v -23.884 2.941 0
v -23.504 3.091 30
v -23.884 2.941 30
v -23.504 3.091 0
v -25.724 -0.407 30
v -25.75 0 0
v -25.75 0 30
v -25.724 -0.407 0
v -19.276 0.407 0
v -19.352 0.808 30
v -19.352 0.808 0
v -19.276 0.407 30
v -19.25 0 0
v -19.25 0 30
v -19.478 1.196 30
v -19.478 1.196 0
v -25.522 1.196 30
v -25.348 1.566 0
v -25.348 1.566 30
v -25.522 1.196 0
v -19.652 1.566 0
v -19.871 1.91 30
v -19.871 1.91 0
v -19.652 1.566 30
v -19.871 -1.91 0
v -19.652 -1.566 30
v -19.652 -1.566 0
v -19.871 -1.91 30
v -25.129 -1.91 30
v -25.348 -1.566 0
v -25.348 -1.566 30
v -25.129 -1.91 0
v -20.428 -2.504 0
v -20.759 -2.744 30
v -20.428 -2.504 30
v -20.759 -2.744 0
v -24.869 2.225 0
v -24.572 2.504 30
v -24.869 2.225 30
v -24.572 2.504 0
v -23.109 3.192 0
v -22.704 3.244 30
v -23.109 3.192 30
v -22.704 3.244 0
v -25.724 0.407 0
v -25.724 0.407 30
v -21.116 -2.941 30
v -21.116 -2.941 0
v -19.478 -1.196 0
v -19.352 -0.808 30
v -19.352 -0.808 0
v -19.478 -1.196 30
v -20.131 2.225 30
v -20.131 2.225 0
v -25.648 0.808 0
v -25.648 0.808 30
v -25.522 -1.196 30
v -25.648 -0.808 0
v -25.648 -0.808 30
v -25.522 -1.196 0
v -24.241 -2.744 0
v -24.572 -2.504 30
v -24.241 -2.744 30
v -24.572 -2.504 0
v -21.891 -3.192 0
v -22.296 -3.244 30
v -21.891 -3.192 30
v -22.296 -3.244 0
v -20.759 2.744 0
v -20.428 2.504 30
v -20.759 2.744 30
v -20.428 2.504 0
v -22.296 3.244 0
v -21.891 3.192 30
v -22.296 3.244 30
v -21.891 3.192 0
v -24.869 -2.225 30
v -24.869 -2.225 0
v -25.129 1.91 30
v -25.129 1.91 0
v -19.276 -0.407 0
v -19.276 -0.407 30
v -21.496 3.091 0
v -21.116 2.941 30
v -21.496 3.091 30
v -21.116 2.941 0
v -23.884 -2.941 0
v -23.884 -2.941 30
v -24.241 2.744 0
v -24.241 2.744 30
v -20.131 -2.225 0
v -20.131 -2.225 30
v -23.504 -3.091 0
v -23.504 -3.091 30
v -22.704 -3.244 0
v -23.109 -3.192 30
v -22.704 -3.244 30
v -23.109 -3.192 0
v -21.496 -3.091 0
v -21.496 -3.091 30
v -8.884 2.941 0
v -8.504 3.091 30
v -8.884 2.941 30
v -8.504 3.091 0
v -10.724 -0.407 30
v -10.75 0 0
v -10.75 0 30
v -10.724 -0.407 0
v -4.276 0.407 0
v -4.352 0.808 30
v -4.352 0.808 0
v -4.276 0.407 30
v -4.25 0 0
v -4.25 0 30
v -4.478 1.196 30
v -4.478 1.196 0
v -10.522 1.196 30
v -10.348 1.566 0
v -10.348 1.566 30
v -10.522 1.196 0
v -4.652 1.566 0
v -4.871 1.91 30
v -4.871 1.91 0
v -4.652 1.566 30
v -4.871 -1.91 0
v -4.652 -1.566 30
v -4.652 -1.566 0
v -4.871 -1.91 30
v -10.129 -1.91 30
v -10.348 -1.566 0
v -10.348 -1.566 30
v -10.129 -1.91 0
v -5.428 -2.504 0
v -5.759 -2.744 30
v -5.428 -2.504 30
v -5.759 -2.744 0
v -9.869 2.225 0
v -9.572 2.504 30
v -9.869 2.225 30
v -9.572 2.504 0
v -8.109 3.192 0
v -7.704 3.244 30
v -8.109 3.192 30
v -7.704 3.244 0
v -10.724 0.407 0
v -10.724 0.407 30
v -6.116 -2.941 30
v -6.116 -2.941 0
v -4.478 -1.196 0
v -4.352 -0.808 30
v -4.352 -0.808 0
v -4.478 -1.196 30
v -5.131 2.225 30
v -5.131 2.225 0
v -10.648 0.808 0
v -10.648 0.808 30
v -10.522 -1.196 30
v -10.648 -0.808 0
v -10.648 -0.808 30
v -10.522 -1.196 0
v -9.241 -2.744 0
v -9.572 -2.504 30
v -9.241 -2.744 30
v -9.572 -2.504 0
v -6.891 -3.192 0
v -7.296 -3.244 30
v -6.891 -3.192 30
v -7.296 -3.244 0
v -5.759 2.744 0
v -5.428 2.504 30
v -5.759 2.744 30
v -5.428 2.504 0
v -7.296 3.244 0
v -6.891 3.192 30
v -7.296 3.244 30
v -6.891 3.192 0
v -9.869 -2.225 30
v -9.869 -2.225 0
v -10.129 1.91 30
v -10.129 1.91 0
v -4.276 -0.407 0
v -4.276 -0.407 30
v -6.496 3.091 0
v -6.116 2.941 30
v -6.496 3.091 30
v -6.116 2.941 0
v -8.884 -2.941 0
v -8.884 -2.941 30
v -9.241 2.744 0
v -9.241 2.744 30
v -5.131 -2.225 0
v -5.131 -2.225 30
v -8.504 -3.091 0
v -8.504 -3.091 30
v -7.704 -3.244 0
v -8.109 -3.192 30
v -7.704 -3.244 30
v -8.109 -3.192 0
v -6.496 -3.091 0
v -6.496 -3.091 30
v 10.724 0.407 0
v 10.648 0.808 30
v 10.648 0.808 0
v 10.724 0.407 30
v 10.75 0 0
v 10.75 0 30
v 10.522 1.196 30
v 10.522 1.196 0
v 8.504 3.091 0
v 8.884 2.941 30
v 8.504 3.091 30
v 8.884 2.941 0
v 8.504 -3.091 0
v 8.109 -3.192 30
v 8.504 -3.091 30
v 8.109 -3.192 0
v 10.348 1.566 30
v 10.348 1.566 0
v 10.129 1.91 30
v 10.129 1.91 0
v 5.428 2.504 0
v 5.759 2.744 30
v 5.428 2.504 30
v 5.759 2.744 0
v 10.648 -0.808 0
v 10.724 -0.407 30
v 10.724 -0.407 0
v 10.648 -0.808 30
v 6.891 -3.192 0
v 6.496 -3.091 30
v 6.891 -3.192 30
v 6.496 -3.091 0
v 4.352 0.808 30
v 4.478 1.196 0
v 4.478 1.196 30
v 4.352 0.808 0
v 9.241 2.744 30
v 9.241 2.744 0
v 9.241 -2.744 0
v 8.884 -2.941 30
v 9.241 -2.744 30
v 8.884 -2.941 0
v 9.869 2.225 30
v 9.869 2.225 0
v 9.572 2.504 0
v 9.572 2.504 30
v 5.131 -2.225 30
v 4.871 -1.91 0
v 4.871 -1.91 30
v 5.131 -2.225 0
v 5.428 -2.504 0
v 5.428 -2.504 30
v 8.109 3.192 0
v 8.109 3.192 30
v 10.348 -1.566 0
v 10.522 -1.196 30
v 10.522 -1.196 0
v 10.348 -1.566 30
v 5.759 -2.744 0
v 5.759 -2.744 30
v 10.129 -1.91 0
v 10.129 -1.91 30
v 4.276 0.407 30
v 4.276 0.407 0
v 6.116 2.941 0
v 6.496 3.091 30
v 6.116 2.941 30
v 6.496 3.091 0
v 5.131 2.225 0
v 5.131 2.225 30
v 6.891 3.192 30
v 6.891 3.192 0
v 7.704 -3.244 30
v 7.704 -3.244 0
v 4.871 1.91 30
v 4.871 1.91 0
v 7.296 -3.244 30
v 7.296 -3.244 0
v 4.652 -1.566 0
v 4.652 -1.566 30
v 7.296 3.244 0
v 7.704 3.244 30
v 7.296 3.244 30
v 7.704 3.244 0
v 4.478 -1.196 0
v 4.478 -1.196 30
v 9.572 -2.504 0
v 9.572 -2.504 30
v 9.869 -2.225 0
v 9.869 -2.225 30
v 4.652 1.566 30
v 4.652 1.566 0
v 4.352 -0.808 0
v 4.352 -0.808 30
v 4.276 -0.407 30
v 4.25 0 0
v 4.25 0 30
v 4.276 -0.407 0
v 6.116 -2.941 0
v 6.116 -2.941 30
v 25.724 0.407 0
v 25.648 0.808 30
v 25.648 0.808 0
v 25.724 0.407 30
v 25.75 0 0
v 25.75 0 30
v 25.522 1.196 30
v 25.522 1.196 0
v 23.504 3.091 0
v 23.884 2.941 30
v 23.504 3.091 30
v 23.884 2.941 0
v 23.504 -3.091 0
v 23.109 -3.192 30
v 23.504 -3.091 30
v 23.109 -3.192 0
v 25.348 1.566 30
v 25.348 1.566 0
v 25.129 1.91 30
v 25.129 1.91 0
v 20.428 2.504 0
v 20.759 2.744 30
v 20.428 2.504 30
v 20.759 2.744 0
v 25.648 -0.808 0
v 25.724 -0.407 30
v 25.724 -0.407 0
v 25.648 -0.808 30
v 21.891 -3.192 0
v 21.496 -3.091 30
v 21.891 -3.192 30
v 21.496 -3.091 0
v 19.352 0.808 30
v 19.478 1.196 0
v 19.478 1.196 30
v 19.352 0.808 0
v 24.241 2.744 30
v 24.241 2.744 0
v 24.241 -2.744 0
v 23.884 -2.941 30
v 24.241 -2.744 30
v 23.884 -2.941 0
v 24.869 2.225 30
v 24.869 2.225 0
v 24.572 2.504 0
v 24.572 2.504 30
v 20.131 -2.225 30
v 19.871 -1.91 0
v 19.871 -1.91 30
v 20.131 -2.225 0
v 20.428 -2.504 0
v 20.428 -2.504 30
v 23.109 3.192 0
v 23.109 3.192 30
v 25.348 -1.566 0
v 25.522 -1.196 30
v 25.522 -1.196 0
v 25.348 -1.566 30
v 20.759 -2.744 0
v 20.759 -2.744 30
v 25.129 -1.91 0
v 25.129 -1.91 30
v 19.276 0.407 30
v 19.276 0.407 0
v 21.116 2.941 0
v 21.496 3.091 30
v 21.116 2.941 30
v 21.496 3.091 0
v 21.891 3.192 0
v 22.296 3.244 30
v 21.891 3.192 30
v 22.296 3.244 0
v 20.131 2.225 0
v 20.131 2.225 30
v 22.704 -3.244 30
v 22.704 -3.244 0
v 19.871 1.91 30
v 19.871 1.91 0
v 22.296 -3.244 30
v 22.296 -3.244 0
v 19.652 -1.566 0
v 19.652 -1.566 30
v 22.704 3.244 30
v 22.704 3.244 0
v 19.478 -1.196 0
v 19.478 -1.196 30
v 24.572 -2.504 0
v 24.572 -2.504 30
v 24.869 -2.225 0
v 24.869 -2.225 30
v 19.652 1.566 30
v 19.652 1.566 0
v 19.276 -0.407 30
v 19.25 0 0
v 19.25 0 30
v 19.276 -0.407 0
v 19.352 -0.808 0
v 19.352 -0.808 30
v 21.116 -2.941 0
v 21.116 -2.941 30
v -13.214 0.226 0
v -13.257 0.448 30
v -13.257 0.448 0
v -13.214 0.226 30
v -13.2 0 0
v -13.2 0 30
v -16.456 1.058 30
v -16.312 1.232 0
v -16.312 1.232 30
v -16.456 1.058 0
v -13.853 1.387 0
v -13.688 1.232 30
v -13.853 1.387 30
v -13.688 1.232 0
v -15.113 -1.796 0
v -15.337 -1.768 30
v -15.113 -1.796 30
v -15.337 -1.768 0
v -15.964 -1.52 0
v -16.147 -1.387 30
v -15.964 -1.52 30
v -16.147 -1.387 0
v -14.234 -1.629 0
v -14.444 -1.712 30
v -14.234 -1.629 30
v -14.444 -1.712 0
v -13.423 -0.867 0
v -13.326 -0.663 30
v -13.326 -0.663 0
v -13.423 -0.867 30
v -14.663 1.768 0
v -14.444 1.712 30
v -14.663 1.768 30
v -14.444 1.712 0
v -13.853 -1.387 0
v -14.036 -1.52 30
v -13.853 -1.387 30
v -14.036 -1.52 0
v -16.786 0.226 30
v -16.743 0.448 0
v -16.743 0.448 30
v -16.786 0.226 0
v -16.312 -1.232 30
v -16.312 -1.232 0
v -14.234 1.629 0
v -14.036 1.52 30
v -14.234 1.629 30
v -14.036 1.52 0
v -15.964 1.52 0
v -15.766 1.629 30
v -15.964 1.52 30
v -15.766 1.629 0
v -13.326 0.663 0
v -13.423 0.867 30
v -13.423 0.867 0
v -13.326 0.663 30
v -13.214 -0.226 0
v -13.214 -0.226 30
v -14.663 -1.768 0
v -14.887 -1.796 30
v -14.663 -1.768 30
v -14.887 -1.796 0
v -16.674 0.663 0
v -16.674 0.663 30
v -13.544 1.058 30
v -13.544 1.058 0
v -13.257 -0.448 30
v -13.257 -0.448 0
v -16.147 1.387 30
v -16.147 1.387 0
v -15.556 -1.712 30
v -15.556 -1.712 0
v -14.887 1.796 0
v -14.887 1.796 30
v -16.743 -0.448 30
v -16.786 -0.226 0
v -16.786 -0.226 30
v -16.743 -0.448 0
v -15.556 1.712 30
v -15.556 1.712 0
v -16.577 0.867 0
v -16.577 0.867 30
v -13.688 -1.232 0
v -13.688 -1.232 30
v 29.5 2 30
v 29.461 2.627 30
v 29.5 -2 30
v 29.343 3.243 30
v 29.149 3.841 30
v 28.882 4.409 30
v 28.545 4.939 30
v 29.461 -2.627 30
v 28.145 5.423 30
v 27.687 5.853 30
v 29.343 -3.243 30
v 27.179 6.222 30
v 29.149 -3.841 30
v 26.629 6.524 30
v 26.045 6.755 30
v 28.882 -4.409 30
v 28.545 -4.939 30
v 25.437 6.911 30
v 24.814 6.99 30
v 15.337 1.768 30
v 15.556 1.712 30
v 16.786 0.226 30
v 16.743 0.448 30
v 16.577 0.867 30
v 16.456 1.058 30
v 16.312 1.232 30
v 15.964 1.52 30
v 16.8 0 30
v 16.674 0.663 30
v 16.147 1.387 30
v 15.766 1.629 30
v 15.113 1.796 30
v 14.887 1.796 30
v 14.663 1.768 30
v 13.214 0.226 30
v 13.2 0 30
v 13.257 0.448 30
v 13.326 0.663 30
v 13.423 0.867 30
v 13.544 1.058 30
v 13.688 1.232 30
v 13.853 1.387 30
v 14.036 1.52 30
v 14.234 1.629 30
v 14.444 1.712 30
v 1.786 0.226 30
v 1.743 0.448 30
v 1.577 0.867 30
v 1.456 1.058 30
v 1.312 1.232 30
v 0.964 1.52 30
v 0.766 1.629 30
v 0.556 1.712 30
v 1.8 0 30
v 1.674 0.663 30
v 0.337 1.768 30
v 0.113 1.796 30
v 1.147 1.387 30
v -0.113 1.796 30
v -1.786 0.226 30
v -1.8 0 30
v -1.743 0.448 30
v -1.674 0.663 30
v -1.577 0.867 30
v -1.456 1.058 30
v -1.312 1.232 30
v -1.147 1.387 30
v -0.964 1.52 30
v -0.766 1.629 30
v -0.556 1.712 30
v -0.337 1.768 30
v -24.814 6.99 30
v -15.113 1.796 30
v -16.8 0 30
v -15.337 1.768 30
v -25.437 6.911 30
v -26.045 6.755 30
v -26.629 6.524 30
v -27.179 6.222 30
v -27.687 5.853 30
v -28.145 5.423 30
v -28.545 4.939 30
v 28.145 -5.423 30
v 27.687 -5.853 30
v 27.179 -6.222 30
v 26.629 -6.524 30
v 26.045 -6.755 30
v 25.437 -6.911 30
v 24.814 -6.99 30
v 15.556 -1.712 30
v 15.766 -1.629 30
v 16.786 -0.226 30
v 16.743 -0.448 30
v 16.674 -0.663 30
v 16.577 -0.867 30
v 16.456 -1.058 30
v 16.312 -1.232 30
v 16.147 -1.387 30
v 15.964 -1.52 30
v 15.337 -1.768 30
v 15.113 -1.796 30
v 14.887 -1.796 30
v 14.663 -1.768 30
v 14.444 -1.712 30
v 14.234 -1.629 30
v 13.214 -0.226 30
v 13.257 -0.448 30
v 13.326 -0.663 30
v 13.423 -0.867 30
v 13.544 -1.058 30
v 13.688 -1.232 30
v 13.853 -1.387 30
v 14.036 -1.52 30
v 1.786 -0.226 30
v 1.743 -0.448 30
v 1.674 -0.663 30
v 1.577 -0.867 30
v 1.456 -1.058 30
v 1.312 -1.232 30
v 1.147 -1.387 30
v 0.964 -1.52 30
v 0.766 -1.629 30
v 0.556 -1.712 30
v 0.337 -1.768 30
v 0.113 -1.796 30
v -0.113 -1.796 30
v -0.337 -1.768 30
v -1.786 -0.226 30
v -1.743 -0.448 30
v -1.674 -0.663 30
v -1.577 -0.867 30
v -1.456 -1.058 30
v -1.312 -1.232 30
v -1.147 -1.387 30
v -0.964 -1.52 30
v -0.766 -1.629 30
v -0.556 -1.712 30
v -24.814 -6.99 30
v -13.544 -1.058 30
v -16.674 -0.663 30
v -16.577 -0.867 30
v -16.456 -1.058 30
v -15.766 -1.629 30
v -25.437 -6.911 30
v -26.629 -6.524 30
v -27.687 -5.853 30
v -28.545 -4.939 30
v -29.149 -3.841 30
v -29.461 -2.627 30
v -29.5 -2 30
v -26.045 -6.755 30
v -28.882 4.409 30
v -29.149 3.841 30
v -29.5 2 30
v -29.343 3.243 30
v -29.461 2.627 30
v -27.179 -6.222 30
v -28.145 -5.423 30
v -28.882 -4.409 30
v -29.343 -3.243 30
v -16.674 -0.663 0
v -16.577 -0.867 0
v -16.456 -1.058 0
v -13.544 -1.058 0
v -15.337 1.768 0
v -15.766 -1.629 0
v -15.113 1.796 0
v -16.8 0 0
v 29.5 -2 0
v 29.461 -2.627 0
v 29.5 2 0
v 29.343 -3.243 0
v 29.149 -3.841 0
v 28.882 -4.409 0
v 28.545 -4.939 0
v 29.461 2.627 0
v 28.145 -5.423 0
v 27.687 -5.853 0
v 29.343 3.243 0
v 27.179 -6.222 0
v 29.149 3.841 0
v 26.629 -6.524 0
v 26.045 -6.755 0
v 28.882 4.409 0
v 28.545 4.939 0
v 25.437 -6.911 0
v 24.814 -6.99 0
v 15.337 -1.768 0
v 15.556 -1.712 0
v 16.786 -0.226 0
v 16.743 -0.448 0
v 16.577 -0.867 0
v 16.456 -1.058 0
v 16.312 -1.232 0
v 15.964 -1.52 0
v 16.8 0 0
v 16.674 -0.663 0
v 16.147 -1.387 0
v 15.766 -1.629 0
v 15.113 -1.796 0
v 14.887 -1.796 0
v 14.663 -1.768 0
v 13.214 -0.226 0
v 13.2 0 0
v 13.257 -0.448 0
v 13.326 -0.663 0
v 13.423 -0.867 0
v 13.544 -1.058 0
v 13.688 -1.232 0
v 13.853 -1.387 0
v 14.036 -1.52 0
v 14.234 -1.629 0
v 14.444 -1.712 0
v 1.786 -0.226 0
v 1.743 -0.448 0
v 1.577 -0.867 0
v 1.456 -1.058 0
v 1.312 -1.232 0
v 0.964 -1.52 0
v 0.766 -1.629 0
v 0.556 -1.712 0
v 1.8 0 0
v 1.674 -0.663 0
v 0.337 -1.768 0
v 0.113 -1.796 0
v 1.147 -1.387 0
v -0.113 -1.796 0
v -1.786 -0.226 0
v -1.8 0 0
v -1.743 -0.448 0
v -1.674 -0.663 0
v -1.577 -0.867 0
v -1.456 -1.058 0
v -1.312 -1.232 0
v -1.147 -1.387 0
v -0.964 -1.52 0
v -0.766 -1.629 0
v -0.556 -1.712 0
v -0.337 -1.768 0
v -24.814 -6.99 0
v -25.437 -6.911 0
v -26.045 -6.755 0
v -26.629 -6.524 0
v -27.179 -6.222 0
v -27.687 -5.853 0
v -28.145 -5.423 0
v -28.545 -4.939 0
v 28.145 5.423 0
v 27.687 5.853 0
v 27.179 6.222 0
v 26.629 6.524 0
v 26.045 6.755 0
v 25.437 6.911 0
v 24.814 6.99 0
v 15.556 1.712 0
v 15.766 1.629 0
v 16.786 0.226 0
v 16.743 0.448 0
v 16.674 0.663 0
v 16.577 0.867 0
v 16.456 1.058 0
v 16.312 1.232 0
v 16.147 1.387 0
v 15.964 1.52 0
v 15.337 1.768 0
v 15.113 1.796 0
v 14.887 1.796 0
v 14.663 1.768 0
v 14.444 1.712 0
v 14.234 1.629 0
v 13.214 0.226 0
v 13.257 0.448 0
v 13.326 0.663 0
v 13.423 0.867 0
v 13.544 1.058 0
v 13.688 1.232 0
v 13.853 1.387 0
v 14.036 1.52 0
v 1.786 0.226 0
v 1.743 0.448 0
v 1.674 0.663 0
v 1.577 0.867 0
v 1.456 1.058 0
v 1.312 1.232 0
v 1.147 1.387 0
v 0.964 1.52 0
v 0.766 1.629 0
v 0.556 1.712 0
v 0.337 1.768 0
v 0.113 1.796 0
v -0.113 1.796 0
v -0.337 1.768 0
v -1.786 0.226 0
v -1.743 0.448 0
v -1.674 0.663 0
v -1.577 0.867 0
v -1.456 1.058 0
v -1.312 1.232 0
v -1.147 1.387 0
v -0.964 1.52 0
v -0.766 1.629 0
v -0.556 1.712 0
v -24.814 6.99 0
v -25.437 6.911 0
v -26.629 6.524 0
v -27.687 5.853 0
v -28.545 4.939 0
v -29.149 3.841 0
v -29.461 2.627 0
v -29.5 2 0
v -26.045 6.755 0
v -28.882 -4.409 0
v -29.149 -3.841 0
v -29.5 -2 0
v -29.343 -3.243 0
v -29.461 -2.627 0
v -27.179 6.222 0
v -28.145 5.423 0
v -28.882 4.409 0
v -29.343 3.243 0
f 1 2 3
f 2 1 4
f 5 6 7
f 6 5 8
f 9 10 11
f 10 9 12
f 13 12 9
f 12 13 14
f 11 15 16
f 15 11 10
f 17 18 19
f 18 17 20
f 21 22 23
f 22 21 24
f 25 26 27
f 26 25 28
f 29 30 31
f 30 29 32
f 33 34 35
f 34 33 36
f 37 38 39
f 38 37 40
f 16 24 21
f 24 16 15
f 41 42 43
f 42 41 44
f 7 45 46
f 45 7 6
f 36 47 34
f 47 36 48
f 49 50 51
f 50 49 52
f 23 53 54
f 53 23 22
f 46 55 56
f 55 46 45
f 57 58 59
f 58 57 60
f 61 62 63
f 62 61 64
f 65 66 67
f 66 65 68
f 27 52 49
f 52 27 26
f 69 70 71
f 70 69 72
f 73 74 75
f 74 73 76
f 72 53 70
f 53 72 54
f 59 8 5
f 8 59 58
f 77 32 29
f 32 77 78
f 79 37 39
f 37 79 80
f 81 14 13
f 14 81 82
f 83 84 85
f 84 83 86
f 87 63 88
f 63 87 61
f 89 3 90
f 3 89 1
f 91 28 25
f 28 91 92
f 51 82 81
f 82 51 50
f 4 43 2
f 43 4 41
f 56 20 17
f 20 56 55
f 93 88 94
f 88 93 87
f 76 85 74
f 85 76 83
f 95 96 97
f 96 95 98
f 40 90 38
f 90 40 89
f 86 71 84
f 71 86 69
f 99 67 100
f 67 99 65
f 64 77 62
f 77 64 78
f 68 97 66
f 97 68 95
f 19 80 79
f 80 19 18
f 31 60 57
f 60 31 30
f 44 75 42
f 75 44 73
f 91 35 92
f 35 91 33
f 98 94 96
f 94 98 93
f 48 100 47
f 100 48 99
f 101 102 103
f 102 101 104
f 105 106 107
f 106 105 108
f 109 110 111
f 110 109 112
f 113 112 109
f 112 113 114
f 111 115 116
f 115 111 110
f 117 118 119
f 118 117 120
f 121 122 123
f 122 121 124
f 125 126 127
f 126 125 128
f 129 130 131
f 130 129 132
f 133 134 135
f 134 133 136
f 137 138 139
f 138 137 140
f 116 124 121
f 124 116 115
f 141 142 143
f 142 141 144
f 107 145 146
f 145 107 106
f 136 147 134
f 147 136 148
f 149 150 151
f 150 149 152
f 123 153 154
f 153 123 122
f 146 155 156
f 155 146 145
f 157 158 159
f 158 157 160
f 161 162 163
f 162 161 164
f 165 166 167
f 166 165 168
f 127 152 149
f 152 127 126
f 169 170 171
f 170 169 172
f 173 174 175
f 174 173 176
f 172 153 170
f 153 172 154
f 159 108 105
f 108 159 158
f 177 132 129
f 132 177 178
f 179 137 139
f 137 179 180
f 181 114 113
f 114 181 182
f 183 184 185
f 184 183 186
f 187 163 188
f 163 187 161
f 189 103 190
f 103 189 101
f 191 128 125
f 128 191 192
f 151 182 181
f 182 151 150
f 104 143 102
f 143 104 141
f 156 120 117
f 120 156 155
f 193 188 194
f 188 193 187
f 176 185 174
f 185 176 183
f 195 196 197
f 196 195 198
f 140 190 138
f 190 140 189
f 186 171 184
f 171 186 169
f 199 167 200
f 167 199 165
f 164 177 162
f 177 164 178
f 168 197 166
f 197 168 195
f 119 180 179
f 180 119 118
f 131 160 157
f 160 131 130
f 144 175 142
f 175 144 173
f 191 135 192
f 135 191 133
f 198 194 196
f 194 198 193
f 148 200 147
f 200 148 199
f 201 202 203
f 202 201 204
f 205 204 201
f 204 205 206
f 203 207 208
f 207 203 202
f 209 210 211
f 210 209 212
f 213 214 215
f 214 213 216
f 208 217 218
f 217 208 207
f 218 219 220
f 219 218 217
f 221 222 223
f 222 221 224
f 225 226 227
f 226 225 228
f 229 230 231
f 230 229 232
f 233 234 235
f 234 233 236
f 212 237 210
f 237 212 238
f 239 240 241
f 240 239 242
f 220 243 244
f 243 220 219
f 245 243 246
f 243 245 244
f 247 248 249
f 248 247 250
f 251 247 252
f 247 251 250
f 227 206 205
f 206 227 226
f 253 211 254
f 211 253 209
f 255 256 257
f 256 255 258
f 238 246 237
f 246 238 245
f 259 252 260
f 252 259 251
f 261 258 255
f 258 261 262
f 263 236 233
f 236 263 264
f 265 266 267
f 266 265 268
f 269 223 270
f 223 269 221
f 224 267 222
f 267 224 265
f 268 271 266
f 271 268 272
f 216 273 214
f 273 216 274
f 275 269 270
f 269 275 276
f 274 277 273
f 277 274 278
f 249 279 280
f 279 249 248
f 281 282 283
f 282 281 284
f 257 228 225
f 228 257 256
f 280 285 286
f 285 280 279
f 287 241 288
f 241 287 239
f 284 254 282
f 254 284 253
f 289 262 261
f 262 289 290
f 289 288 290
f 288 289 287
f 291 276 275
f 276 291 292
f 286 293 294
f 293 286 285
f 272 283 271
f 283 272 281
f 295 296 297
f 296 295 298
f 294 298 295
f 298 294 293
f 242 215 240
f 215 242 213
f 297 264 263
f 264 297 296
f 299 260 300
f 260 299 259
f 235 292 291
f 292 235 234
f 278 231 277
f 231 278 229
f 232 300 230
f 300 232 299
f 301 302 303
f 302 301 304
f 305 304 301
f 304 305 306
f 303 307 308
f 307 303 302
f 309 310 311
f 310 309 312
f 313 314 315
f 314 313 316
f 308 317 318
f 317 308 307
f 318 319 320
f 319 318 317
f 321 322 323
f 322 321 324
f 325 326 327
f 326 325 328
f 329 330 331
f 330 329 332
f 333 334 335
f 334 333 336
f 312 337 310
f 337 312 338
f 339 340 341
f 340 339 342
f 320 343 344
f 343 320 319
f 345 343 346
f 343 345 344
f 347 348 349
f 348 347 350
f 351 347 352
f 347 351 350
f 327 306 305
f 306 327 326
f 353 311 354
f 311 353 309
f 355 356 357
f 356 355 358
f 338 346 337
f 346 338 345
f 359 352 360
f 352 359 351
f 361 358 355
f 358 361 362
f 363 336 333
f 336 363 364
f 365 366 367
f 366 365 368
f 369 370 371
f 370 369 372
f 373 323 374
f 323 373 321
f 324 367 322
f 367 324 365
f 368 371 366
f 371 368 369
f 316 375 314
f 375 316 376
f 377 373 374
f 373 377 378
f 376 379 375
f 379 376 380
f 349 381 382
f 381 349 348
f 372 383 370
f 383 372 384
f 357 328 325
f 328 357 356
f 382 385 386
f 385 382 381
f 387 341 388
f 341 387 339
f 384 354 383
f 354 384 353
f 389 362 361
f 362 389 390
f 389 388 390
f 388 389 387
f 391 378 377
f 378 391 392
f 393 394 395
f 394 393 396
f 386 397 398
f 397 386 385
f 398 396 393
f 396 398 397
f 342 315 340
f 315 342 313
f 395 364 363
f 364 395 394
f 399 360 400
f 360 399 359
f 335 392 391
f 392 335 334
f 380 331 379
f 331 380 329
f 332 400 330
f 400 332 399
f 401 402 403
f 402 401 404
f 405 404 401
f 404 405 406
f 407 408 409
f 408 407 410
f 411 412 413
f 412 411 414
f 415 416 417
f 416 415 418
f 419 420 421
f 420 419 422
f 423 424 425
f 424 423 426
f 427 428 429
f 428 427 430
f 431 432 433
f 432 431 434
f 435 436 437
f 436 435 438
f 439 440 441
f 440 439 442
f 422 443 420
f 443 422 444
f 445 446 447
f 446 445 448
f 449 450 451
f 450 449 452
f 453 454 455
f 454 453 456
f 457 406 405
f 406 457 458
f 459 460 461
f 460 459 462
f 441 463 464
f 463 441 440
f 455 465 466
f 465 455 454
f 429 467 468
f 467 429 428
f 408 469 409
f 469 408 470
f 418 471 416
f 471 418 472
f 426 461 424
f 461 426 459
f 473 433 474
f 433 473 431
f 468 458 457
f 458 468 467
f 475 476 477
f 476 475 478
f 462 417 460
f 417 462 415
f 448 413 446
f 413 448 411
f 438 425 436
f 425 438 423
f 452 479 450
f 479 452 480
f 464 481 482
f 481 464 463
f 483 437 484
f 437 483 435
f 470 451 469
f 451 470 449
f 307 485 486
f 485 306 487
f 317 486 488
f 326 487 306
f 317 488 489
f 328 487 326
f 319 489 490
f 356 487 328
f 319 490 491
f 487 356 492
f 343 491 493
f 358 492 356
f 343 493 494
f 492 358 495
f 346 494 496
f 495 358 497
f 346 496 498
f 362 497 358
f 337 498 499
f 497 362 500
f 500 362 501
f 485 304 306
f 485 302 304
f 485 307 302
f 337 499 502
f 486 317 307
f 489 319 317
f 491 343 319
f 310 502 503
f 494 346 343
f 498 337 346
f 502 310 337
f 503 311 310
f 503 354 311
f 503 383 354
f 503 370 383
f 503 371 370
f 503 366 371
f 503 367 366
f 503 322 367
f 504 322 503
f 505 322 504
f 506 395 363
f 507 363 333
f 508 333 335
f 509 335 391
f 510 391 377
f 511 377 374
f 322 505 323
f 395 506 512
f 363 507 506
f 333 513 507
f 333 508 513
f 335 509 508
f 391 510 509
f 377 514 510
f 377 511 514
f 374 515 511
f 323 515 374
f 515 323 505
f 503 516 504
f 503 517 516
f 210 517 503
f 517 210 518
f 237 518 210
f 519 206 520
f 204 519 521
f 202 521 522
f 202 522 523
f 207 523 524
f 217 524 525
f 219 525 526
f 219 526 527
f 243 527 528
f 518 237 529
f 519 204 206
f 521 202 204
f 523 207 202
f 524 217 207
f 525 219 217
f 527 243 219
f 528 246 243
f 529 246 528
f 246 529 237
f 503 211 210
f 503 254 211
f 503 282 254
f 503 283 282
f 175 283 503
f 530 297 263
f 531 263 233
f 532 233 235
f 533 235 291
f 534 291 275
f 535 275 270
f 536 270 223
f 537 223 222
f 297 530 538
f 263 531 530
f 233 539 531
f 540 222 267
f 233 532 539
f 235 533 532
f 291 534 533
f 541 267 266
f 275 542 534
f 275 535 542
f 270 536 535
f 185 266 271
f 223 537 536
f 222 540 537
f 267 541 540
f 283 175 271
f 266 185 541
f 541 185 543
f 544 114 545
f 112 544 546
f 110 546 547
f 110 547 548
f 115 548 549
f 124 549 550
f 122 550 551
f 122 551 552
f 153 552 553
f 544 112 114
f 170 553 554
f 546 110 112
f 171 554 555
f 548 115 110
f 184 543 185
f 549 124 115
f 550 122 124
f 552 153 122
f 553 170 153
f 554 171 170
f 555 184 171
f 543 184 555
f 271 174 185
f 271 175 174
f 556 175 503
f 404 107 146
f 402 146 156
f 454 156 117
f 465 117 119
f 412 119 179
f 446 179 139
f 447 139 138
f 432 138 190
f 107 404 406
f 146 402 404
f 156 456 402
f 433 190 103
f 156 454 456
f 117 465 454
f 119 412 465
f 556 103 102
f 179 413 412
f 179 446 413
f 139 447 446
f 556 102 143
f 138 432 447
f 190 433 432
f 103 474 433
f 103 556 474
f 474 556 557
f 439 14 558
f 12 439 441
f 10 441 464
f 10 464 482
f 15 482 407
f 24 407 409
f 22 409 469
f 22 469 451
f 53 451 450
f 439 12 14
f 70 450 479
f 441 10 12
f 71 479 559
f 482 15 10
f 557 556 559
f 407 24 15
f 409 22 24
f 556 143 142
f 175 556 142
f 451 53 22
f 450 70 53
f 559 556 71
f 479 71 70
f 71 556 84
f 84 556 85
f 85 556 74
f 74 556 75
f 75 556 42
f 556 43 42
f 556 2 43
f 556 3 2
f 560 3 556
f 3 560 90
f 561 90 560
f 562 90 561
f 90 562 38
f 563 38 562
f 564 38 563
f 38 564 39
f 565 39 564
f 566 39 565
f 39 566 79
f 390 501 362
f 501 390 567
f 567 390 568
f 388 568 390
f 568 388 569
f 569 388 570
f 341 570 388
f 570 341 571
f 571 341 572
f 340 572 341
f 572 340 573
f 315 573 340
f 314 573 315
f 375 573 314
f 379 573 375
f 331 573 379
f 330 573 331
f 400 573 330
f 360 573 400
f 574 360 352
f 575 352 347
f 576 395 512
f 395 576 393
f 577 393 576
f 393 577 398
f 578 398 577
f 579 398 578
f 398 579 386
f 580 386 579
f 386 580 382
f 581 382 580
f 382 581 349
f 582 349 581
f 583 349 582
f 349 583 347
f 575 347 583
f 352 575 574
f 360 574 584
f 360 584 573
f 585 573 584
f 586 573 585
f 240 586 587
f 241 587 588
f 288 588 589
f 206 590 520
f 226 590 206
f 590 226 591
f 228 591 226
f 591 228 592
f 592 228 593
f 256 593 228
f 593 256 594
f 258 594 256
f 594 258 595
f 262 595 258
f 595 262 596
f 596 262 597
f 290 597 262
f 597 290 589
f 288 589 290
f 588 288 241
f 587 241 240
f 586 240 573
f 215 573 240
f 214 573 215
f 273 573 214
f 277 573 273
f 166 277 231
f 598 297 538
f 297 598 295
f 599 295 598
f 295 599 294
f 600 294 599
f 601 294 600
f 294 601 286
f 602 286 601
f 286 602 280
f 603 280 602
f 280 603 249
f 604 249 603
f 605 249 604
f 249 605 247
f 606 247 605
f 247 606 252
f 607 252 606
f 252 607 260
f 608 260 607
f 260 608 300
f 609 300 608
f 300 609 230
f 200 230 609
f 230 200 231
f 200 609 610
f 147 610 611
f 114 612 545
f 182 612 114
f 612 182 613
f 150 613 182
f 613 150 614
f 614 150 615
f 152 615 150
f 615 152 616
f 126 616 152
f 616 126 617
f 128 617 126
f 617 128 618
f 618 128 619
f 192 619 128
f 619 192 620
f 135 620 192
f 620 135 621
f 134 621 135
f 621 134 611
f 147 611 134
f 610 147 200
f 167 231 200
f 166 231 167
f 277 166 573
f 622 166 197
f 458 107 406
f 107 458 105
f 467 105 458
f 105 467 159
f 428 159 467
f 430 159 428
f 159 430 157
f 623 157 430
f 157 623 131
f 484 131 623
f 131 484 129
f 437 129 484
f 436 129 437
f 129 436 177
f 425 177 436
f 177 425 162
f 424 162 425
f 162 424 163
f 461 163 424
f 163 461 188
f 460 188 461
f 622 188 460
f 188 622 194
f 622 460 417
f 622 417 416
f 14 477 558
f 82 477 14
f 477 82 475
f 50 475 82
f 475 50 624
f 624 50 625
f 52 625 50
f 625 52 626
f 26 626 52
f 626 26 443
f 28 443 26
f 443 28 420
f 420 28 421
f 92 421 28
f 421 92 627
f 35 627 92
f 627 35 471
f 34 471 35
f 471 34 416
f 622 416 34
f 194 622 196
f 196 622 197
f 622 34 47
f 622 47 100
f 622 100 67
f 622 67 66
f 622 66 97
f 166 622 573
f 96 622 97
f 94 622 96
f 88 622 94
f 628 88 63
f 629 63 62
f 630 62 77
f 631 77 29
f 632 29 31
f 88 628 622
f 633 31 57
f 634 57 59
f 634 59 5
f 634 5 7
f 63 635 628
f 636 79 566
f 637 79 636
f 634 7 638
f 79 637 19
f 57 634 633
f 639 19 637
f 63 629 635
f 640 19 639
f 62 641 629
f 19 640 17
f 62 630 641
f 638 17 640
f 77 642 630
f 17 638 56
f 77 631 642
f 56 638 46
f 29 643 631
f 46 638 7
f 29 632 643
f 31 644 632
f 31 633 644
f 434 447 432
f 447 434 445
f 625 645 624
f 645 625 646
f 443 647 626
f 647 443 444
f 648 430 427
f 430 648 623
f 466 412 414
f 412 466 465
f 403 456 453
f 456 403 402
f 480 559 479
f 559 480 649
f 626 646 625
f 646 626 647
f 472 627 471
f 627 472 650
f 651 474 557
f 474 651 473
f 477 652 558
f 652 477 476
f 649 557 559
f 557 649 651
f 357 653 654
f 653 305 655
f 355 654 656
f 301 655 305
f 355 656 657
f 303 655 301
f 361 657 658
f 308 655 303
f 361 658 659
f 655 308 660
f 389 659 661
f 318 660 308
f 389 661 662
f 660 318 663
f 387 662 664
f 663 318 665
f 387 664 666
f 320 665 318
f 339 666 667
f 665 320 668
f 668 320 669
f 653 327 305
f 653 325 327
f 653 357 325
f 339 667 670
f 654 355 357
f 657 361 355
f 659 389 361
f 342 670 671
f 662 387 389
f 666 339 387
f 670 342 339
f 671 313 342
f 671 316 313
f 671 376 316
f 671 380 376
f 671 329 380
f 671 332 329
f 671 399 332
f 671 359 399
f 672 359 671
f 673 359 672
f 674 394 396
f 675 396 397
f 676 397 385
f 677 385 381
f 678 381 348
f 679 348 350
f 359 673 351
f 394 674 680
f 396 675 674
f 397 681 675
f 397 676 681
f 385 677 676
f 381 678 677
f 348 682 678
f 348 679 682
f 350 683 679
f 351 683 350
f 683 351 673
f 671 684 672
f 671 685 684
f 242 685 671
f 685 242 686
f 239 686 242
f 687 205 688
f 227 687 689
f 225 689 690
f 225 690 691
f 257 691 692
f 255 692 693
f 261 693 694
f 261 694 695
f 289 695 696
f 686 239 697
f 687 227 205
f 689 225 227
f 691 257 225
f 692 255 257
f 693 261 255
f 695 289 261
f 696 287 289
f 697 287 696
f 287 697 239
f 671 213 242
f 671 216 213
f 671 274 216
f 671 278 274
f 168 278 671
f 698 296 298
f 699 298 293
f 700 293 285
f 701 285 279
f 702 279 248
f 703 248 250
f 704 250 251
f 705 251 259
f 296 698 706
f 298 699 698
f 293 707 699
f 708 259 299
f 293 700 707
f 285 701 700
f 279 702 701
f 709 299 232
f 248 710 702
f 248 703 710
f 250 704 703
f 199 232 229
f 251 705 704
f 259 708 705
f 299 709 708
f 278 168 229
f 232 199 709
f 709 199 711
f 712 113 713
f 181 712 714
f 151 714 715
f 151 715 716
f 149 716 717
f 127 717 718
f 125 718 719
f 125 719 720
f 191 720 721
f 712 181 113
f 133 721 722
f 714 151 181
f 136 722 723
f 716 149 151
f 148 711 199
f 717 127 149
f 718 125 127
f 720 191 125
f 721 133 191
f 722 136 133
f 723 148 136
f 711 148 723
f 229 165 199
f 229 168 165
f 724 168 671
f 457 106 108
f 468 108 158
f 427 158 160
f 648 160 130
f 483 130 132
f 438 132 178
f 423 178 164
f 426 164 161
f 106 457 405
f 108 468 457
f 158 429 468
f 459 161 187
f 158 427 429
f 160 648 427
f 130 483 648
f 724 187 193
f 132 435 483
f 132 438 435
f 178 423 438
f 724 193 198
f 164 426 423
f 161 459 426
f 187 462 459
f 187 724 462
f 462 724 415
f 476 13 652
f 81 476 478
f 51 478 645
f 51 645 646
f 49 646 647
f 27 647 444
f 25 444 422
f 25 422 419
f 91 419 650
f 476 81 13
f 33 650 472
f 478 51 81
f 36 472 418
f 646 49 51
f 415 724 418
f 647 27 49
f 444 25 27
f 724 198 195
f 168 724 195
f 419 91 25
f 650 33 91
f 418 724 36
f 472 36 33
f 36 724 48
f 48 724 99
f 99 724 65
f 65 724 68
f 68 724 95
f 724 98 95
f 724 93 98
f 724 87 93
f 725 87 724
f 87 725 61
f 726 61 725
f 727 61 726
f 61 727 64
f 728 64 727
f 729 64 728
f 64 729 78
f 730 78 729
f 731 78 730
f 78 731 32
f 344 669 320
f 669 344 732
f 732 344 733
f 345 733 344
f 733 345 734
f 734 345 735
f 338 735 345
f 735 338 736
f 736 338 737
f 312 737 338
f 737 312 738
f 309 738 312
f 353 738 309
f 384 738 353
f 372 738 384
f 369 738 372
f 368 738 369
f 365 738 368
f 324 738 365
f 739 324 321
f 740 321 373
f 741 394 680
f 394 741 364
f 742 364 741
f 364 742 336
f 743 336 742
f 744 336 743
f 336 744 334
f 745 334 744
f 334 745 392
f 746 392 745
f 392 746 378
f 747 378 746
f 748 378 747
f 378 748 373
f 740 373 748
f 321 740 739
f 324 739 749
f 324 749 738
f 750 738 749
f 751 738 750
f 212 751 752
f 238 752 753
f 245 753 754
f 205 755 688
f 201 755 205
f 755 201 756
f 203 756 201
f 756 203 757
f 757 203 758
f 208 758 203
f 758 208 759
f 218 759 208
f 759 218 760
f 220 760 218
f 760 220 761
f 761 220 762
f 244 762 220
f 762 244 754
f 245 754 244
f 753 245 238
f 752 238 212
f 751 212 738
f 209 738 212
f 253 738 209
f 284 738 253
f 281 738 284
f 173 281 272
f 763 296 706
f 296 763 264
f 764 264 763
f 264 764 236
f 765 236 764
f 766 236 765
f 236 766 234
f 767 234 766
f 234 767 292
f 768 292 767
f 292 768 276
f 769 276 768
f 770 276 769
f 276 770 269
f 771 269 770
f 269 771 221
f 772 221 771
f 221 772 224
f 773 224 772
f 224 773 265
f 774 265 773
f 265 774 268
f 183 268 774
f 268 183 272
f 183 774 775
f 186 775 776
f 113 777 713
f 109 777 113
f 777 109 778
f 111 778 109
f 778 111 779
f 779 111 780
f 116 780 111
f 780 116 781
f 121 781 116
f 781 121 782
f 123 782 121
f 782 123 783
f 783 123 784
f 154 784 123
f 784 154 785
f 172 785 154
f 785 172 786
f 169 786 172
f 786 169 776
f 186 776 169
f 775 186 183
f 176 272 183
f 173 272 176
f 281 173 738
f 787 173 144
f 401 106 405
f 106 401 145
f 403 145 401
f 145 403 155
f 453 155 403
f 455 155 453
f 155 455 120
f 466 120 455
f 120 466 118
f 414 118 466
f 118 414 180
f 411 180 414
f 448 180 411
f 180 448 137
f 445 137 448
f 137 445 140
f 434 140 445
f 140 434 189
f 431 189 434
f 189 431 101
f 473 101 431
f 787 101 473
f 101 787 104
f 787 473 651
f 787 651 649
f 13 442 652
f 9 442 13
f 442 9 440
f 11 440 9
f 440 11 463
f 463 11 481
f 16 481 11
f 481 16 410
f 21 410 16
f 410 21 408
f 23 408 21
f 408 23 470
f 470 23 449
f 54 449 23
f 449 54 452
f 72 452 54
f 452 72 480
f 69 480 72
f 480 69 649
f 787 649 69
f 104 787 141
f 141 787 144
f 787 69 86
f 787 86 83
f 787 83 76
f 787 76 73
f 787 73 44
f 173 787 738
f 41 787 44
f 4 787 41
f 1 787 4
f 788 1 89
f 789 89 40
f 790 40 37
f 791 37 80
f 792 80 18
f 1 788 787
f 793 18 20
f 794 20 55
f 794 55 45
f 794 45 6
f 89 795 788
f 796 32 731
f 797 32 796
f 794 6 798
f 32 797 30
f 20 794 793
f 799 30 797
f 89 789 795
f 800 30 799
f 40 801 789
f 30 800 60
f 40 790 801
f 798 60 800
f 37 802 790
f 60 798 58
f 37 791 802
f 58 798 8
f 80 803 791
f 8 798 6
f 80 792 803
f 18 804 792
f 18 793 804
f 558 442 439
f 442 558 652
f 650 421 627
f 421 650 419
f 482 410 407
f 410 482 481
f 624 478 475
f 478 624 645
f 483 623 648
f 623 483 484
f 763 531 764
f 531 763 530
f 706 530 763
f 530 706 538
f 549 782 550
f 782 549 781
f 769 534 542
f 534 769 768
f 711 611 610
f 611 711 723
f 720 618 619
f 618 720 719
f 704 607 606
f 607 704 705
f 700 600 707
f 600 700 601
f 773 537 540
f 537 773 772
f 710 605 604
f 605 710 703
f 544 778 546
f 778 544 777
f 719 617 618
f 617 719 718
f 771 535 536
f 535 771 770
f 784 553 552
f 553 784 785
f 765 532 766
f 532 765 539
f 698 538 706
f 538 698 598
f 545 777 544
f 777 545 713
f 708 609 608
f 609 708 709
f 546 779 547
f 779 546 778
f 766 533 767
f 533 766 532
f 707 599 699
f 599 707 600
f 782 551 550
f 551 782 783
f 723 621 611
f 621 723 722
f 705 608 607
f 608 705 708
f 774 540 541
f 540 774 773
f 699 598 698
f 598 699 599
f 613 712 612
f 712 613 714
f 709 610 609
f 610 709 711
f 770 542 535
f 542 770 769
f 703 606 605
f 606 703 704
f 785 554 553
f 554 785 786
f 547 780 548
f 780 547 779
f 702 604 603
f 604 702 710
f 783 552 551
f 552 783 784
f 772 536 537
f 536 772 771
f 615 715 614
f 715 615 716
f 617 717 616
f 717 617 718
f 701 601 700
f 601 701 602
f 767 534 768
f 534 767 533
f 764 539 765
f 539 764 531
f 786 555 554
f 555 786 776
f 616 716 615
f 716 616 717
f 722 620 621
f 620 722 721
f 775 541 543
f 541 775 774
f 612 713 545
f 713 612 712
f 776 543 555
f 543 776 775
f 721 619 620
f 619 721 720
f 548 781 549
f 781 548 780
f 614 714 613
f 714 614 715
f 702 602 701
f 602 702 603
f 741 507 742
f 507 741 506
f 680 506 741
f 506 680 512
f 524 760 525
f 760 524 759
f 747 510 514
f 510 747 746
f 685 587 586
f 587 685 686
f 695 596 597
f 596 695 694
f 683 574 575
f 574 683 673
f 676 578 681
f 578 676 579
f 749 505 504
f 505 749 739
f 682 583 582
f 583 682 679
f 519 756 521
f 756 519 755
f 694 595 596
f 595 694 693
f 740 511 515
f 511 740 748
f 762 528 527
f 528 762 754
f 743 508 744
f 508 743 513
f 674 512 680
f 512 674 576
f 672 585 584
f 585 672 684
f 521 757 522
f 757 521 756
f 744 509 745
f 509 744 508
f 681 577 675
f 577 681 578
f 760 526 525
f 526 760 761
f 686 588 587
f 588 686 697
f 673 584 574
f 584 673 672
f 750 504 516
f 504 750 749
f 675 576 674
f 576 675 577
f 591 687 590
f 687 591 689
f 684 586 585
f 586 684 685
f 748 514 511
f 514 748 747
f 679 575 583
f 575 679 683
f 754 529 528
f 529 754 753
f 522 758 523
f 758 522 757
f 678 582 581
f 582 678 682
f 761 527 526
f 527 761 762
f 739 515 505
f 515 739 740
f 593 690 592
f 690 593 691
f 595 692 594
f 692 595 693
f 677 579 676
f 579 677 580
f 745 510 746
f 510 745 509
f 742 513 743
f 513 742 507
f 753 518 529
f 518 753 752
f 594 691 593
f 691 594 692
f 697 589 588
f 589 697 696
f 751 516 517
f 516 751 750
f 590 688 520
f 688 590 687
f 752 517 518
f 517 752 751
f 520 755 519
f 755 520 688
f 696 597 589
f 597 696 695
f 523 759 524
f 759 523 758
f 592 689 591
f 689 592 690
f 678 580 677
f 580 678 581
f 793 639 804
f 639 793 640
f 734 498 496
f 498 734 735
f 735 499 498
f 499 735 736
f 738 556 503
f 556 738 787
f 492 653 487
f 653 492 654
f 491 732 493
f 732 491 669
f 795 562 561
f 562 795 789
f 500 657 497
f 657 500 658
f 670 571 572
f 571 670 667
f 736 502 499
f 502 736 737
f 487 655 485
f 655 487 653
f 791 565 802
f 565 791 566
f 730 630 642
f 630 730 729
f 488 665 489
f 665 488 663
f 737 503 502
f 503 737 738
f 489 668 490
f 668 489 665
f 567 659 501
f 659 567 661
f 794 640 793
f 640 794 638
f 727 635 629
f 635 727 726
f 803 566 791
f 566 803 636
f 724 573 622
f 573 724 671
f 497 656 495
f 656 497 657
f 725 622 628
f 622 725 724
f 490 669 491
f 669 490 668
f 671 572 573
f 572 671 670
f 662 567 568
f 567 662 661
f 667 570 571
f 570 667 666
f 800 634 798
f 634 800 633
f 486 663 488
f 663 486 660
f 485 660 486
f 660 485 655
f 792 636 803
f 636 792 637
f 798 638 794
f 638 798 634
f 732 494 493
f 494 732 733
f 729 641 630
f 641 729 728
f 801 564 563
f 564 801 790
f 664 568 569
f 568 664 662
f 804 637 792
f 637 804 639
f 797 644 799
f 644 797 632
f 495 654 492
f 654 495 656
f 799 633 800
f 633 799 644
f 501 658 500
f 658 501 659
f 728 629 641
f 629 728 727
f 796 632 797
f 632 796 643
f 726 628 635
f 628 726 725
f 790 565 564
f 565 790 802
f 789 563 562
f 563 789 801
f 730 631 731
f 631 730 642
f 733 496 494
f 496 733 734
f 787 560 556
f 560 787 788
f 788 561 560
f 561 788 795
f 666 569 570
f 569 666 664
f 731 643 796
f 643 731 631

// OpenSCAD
$fn = 50;


difference() {
	union() {
		hull() {
			translate(v = [-24.5000000000, 2.0000000000, 0]) {
				cylinder(h = 30, r = 5);
			}
			translate(v = [24.5000000000, 2.0000000000, 0]) {
				cylinder(h = 30, r = 5);
			}
			translate(v = [-24.5000000000, -2.0000000000, 0]) {
				cylinder(h = 30, r = 5);
			}
			translate(v = [24.5000000000, -2.0000000000, 0]) {
				cylinder(h = 30, r = 5);
			}
		}
	}
	union() {
		translate(v = [-22.5000000000, 0.0000000000, -100.0000000000]) {
			cylinder(h = 200, r = 3.2500000000);
		}
		translate(v = [-7.5000000000, 0.0000000000, -100.0000000000]) {
			cylinder(h = 200, r = 3.2500000000);
		}
		translate(v = [7.5000000000, 0.0000000000, -100.0000000000]) {
			cylinder(h = 200, r = 3.2500000000);
		}
		translate(v = [22.5000000000, 0.0000000000, -100.0000000000]) {
			cylinder(h = 200, r = 3.2500000000);
		}
		translate(v = [-22.5000000000, 0.0000000000, 0]) {
			cylinder(h = 30, r = 1.8000000000);
		}
		translate(v = [-15.0000000000, 0.0000000000, 0]) {
			cylinder(h = 30, r = 1.8000000000);
		}
		translate(v = [-7.5000000000, 0.0000000000, 0]) {
			cylinder(h = 30, r = 1.8000000000);
		}
		cylinder(h = 30, r = 1.8000000000);
		translate(v = [7.5000000000, 0.0000000000, 0]) {
			cylinder(h = 30, r = 1.8000000000);
		}
		translate(v = [15.0000000000, 0.0000000000, 0]) {
			cylinder(h = 30, r = 1.8000000000);
		}
		translate(v = [22.5000000000, 0.0000000000, 0]) {
			cylinder(h = 30, r = 1.8000000000);
		}
		translate(v = [-22.5000000000, 0.0000000000, 0]) {
			cylinder(h = 30, r = 1.8000000000);
		}
		translate(v = [-15.0000000000, 0.0000000000, 0]) {
			cylinder(h = 30, r = 1.8000000000);
		}
		translate(v = [-7.5000000000, 0.0000000000, 0]) {
			cylinder(h = 30, r = 1.8000000000);
		}
		cylinder(h = 30, r = 1.8000000000);
		translate(v = [7.5000000000, 0.0000000000, 0]) {
			cylinder(h = 30, r = 1.8000000000);
		}
		translate(v = [15.0000000000, 0.0000000000, 0]) {
			cylinder(h = 30, r = 1.8000000000);
		}
		translate(v = [22.5000000000, 0.0000000000, 0]) {
			cylinder(h = 30, r = 1.8000000000);
		}
		translate(v = [-22.5000000000, 0.0000000000, 0]) {
			cylinder(h = 30, r = 1.8000000000);
		}
		translate(v = [-15.0000000000, 0.0000000000, 0]) {
			cylinder(h = 30, r = 1.8000000000);
		}
		translate(v = [-7.5000000000, 0.0000000000, 0]) {
			cylinder(h = 30, r = 1.8000000000);
		}
		cylinder(h = 30, r = 1.8000000000);
		translate(v = [7.5000000000, 0.0000000000, 0]) {
			cylinder(h = 30, r = 1.8000000000);
		}
		translate(v = [15.0000000000, 0.0000000000, 0]) {
			cylinder(h = 30, r = 1.8000000000);
		}
		translate(v = [22.5000000000, 0.0000000000, 0]) {
			cylinder(h = 30, r = 1.8000000000);
		}
	}
}
